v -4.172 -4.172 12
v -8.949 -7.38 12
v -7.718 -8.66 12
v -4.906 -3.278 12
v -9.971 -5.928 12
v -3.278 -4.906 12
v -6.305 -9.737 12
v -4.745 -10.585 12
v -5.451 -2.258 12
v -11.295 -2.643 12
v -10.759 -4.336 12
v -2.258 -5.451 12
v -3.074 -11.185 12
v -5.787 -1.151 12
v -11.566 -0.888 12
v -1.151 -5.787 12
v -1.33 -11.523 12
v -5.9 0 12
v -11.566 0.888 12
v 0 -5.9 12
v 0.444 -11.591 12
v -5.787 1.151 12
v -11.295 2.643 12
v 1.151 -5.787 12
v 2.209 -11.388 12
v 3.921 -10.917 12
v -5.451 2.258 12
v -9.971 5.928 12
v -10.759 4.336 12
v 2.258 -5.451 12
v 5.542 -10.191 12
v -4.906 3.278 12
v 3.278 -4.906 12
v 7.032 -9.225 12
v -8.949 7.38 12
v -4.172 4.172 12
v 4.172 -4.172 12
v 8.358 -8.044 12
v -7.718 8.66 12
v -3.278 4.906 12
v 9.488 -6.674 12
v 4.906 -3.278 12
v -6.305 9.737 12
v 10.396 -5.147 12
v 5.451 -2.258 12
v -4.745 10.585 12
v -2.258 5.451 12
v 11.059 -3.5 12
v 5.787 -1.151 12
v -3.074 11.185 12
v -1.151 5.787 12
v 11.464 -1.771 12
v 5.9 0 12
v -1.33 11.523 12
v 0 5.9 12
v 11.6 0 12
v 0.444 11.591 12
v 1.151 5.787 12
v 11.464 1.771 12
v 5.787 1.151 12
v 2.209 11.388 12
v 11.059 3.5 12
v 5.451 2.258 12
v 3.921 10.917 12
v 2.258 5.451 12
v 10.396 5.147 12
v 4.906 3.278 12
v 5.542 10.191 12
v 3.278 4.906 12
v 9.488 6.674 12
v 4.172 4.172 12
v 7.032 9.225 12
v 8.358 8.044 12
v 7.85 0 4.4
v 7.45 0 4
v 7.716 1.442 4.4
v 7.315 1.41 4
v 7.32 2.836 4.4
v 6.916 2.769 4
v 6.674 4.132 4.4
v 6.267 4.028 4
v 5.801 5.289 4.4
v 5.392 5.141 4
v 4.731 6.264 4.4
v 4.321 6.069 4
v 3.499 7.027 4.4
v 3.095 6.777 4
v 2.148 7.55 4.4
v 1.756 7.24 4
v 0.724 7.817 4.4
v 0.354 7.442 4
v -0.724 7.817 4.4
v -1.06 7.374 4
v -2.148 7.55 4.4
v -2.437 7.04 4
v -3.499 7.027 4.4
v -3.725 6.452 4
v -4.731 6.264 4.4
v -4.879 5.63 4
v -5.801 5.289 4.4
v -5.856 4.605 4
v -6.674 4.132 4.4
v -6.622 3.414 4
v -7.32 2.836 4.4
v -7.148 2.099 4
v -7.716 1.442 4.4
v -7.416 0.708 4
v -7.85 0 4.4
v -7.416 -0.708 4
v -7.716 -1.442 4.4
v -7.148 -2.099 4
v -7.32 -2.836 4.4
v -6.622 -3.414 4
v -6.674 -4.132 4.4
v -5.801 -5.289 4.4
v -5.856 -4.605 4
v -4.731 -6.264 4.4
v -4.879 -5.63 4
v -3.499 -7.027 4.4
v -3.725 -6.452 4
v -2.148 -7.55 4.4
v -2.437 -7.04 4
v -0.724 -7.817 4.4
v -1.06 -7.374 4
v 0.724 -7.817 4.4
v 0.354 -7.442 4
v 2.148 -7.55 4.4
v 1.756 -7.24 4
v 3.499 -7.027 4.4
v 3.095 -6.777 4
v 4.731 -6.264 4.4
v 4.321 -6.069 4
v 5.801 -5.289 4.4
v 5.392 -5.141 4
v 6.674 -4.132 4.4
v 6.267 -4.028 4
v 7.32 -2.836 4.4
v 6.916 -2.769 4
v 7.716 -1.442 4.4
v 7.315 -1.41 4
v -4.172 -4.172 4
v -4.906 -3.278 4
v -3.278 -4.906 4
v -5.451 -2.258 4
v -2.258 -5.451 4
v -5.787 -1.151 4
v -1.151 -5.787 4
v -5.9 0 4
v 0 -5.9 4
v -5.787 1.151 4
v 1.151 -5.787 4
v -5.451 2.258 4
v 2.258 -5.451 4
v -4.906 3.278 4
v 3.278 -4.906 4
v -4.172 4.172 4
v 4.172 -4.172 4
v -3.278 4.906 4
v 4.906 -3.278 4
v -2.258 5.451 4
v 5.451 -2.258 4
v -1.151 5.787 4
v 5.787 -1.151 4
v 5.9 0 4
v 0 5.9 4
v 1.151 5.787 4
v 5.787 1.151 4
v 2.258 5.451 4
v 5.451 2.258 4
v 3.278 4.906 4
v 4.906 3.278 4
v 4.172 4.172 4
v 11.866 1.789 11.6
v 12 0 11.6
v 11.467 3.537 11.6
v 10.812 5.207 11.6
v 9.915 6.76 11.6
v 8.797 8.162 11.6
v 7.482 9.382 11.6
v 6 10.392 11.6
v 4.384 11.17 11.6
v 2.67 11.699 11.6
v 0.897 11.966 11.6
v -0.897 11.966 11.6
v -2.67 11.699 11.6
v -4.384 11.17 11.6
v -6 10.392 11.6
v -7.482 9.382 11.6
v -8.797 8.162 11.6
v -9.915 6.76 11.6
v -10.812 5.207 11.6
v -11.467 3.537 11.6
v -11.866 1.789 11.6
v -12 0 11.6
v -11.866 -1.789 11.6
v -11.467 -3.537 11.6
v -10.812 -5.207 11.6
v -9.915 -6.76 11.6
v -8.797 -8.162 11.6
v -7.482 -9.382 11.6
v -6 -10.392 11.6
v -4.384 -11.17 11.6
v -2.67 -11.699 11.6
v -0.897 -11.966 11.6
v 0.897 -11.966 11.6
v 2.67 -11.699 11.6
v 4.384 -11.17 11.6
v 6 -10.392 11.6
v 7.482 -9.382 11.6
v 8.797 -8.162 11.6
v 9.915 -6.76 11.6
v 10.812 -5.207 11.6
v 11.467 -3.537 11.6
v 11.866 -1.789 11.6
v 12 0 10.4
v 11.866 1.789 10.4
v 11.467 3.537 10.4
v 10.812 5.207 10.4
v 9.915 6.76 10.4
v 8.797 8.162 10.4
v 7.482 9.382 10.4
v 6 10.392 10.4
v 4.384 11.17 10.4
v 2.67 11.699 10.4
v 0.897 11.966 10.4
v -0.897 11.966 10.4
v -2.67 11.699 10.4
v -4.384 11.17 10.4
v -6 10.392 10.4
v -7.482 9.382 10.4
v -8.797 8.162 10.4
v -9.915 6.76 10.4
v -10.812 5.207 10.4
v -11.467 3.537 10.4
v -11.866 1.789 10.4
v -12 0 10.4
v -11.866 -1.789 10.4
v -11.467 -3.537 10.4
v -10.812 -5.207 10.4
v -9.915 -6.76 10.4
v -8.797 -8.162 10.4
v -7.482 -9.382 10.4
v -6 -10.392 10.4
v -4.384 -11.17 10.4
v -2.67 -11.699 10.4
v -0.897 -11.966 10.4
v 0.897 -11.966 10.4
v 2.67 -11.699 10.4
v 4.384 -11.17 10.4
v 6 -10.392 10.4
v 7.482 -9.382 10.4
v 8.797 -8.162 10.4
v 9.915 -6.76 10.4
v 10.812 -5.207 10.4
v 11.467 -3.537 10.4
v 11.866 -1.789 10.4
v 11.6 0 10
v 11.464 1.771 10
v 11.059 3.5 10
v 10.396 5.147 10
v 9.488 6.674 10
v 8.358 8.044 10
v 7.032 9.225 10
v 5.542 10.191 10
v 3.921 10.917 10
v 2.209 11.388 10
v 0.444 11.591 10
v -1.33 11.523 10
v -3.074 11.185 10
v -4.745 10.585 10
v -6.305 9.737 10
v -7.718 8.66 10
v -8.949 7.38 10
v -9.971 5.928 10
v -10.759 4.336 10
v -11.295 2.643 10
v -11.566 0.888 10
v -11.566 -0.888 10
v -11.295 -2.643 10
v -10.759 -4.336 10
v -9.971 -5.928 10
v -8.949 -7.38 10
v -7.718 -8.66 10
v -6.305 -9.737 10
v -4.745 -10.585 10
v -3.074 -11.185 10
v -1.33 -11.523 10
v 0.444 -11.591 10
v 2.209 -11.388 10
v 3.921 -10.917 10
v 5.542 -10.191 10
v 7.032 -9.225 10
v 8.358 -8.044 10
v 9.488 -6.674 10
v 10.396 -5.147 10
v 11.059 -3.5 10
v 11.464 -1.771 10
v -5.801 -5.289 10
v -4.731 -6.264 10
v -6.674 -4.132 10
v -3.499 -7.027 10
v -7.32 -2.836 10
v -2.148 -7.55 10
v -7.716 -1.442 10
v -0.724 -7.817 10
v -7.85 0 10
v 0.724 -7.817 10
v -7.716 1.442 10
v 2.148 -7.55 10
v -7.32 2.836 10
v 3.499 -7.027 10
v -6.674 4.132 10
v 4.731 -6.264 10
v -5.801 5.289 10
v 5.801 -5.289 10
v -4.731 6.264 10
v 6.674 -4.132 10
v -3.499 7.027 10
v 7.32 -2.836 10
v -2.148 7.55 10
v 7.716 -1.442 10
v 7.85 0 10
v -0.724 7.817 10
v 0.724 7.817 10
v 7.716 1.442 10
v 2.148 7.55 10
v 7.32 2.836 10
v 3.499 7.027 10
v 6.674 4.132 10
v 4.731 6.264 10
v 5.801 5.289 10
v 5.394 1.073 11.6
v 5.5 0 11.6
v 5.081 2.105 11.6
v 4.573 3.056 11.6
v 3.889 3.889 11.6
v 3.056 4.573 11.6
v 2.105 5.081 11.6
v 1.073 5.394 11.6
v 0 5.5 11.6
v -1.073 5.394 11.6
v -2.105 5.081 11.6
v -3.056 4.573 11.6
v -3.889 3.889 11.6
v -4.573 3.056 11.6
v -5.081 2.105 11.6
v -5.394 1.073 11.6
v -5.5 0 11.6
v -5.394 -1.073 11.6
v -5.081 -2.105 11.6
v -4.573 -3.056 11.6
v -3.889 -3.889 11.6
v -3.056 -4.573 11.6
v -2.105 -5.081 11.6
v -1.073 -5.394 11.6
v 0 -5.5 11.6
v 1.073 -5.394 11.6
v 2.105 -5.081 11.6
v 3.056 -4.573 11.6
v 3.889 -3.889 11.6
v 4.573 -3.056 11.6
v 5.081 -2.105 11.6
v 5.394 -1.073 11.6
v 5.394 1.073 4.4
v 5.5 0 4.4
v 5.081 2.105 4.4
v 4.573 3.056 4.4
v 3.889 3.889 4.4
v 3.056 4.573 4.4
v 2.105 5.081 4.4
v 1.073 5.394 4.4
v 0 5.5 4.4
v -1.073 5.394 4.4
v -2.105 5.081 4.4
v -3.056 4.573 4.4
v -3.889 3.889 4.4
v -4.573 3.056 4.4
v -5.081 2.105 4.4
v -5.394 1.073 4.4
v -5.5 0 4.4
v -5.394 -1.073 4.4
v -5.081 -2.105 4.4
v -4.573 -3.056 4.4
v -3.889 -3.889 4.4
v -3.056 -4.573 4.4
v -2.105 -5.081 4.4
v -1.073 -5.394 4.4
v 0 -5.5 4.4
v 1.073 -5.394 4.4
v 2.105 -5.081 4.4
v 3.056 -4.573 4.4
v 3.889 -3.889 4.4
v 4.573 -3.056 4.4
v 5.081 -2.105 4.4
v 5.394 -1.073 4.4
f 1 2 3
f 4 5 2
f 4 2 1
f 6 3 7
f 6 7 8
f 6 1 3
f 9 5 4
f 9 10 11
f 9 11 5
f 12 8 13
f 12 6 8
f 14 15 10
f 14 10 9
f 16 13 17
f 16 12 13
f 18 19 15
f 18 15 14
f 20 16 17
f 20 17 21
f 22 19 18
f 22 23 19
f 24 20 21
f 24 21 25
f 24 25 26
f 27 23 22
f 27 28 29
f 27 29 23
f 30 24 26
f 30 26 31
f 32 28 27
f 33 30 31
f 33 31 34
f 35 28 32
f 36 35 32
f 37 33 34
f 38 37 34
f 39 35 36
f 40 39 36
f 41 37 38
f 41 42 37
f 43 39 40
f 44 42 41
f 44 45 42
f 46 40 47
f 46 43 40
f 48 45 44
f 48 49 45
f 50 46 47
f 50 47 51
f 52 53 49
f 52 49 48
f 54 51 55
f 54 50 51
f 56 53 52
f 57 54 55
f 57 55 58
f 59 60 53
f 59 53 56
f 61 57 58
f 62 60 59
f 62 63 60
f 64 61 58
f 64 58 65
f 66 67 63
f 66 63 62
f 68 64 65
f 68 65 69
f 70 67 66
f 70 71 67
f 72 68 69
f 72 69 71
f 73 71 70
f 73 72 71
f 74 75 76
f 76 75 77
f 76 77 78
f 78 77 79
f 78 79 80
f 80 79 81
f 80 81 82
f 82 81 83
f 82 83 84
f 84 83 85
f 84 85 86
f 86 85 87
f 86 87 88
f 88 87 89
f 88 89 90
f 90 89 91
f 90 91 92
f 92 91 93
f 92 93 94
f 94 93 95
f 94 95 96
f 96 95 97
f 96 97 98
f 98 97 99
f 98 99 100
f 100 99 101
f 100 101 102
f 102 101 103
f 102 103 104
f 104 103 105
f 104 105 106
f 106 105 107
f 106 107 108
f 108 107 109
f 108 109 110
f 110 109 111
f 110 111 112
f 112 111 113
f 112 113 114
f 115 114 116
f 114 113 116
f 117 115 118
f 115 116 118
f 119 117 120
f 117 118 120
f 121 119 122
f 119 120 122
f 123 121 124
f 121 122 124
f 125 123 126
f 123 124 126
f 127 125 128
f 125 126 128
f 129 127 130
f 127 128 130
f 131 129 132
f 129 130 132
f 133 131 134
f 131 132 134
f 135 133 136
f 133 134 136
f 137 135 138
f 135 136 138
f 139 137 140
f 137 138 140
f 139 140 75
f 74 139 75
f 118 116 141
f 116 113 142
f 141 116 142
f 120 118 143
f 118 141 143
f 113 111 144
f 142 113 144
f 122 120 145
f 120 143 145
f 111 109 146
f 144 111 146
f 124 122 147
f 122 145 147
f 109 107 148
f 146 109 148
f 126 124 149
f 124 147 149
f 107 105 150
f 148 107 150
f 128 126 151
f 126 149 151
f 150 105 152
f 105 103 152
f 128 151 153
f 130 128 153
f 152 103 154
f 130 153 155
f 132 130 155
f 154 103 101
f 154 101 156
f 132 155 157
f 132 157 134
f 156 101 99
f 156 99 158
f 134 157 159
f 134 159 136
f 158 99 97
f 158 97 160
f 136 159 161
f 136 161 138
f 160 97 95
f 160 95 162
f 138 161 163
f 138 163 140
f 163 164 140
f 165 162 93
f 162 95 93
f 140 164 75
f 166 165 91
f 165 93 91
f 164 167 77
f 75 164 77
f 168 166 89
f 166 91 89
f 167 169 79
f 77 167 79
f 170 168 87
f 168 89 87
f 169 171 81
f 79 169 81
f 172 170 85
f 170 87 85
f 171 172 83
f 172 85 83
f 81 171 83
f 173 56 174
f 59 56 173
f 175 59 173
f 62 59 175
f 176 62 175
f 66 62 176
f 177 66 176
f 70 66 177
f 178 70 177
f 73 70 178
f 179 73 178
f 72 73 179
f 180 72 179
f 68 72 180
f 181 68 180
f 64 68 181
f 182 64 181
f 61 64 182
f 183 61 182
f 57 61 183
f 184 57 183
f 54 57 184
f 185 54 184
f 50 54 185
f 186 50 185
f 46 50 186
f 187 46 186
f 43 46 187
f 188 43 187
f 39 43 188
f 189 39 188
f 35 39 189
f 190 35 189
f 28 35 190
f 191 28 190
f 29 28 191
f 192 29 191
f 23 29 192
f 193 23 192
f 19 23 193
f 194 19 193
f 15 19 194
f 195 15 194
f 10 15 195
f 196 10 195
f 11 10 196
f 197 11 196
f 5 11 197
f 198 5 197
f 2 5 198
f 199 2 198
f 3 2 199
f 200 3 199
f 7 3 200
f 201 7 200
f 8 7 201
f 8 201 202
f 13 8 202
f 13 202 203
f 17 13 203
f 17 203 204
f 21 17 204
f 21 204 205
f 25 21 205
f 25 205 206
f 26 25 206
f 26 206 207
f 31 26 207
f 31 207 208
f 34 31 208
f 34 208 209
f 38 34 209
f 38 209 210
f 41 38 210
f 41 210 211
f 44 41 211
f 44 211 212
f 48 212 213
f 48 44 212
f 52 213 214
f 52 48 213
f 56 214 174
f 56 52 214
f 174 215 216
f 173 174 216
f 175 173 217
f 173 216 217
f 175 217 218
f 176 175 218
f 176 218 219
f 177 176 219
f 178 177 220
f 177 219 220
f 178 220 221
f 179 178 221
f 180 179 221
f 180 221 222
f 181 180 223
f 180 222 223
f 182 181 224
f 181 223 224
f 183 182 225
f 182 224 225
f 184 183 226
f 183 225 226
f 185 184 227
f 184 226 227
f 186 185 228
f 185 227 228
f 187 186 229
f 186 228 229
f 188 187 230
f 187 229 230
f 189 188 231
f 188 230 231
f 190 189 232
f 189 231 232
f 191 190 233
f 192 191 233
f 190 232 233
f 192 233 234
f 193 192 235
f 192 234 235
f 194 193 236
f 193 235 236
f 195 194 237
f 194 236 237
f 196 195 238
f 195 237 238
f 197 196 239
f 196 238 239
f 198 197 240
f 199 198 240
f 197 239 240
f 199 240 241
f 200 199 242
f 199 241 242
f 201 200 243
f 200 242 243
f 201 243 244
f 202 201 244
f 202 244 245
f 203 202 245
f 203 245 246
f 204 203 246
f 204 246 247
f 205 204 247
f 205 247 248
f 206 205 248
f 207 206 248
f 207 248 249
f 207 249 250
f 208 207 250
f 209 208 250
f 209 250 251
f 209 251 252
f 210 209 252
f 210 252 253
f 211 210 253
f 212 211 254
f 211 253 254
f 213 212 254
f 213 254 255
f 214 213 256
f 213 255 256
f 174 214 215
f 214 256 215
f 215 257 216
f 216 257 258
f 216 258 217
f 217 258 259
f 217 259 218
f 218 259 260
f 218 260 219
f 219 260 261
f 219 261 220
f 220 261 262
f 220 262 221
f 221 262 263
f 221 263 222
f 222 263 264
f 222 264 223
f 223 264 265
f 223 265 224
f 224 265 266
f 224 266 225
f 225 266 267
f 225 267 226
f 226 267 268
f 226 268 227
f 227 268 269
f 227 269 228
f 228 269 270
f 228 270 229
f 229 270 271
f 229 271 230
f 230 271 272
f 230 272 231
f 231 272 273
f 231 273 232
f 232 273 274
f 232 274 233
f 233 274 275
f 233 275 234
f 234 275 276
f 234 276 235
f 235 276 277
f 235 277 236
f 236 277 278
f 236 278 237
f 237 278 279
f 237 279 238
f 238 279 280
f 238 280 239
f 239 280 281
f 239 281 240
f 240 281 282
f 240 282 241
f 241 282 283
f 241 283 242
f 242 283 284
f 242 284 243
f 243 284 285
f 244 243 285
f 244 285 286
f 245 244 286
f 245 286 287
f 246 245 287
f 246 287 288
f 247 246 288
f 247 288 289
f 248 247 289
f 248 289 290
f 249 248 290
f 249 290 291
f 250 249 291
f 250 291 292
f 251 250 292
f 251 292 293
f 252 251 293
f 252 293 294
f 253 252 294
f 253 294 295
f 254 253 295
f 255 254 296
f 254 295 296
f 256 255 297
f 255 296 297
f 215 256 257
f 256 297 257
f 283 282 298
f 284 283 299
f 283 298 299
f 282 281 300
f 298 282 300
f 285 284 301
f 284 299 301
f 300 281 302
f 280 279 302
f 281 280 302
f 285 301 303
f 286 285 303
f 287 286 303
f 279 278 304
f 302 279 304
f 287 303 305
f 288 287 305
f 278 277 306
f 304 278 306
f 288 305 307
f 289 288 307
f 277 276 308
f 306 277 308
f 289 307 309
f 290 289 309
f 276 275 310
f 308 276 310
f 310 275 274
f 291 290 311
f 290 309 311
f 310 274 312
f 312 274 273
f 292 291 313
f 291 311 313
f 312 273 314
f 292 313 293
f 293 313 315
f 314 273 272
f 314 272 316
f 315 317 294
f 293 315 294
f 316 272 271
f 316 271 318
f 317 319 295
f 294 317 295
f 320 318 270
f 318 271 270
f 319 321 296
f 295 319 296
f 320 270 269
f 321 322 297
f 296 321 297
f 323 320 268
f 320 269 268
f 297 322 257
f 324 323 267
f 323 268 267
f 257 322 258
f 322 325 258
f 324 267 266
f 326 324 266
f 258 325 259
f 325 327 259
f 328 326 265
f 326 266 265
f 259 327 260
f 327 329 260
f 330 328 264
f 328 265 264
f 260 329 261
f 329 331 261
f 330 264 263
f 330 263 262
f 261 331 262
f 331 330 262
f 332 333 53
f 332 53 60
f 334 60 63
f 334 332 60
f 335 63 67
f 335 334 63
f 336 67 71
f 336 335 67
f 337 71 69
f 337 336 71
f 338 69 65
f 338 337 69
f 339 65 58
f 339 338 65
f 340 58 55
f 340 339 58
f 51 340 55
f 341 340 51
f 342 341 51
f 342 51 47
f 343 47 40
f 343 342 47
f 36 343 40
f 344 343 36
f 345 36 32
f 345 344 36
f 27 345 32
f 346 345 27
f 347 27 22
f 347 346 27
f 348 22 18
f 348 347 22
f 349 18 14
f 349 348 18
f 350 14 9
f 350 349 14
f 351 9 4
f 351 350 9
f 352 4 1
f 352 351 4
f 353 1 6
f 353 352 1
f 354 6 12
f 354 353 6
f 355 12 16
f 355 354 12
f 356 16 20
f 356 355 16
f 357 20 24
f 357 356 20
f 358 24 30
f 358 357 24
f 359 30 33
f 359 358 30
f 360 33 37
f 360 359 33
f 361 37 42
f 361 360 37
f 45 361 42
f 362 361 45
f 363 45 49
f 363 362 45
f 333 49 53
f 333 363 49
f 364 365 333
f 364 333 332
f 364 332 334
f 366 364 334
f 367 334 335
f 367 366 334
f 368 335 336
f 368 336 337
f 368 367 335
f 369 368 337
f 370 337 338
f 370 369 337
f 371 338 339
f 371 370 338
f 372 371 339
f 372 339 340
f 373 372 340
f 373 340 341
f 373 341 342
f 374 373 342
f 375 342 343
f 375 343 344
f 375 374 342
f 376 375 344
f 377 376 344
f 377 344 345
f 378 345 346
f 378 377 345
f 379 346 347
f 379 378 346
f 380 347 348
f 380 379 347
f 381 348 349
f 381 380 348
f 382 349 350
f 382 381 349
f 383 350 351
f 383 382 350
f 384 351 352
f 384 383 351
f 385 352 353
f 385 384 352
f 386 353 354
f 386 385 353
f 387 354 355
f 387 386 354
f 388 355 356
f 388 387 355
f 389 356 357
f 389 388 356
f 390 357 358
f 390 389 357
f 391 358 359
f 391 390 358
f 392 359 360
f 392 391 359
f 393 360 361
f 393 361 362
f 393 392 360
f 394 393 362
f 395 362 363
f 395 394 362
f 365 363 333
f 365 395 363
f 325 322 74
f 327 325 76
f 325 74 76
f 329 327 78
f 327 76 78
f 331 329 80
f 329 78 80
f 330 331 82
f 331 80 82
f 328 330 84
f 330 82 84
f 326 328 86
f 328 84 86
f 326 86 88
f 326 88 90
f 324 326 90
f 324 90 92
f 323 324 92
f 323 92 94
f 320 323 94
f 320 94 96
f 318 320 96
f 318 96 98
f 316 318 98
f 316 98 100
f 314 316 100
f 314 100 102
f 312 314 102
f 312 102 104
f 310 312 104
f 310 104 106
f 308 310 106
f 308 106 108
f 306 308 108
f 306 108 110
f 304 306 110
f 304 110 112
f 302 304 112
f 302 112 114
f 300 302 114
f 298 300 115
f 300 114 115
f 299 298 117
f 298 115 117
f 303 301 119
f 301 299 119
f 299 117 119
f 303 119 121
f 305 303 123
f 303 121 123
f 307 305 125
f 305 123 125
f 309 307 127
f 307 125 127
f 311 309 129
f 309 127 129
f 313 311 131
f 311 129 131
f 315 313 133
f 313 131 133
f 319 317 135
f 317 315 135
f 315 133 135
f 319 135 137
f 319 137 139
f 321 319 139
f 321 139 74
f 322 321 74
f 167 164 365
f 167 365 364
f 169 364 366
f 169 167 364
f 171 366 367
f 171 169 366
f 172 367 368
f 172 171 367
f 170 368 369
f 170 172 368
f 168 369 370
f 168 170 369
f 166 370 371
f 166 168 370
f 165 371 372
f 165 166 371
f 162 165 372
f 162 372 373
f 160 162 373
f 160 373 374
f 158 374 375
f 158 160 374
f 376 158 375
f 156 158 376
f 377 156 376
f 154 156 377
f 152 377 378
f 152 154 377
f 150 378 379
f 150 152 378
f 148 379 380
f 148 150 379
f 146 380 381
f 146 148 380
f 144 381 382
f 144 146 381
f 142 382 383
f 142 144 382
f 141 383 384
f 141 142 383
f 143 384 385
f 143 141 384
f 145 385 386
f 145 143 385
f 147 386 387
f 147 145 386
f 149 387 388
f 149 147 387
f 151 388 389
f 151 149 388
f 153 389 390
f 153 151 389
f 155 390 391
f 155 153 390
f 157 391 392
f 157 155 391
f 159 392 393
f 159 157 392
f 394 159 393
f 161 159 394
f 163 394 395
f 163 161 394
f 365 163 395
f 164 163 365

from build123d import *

# Parameters (mm, degrees)
CYLINDER040_R               = 5.5
CYLINDER040_DEPTH           = 8
CYLINDER039_R               = 12
CYLINDER039_DEPTH           = 2
CYLINDER038_R               = 7.85
CYLINDER038_DEPTH           = 8
CHAMFER003068012002091_SIZE = 0.4


with BuildPart() as cylinder040:
    # Cylinder040 → Cylinder040 (new body)
    with BuildSketch(Plane.XY.offset(-2)):
        Circle(CYLINDER040_R)
    extrude(amount=CYLINDER040_DEPTH)


with BuildPart() as cylinder039:
    # Cylinder039 → Cylinder039 (new body)
    with BuildSketch(Plane.XY.offset(4)):
        Circle(CYLINDER039_R)
    extrude(amount=CYLINDER039_DEPTH)


with BuildPart() as bearing_remover_bottom:
    # Cylinder038 → Cylinder038 (new body)
    with BuildSketch(Plane.XY.offset(-2)):
        Circle(CYLINDER038_R)
    extrude(amount=CYLINDER038_DEPTH)

    # Fusion001002012036: union Cylinder039
    add(cylinder039.part)

    # Cut001042: cut Cylinder040
    add(cylinder040.part, mode=Mode.SUBTRACT)

    # Chamfer003068012002091
    chamfer003068012002091_edges = [bearing_remover_bottom.edges().sort_by_distance(p)[0] for p in [
        (-12, 0, 6),
        (-12, 0, 4),
        (-7.85, 0, -2),
        (-5.5, 0, 6),
        (-5.5, 0, -2),
    ]]
    chamfer(chamfer003068012002091_edges, length=CHAMFER003068012002091_SIZE)


with BuildPart() as bearing_remover_bottom_1:
    # Chamfer003068012002091 placement: moved
    add(bearing_remover_bottom.part.moved(Location((0, 0, 6))))


solid = bearing_remover_bottom_1.part
